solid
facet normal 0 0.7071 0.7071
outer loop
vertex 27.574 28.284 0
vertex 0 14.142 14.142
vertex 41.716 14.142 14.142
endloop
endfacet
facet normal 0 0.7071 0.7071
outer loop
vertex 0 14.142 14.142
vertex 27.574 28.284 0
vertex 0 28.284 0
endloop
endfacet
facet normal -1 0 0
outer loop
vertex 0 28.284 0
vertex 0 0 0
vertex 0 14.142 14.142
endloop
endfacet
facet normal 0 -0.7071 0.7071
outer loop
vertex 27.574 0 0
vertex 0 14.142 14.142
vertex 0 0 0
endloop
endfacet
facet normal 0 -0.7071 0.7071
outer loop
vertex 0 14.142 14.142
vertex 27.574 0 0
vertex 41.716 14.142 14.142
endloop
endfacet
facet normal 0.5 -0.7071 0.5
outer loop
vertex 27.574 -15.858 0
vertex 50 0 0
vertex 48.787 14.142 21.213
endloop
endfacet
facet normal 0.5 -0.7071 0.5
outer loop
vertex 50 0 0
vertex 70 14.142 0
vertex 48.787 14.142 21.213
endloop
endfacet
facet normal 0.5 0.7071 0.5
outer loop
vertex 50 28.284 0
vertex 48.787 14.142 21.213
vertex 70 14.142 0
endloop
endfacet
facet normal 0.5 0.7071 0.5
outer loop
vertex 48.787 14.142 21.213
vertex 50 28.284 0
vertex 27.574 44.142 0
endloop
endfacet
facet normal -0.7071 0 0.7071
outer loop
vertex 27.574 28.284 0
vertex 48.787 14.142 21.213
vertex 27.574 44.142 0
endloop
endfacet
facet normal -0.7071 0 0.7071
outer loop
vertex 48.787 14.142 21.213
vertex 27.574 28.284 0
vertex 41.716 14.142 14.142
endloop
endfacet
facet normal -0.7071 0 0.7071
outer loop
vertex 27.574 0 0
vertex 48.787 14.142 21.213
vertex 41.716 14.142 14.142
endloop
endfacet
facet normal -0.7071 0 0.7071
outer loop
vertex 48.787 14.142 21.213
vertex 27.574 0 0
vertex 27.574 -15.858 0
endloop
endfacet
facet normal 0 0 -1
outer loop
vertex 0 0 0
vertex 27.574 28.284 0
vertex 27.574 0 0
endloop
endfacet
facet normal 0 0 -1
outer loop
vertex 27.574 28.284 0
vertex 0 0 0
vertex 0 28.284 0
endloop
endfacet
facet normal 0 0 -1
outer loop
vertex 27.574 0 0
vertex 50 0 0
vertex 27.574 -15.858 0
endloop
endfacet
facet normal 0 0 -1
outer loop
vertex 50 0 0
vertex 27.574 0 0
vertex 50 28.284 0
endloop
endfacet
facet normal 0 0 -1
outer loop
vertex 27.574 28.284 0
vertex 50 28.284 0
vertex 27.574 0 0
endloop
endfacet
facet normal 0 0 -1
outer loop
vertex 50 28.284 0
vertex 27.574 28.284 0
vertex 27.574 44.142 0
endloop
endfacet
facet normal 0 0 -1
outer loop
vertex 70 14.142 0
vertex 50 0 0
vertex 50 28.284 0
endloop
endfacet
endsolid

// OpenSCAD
intersection() {
	union() {
		rotate([-45, 0, 0]) {
			cube([50, 20, 20]);
		}
		translate([70, 20 / sqrt(2),0]) {
			mirror([1, 0, 0]) {
				rotate([90, 45, 0]) {
					rotate([0, 45, 0]) {
						cube([60, 30, 60]);
					}
				}
			}
		}
	}
	//translate([0,20 / sqrt(2), 0]) { //Half arrow.
	translate([0, -50, 0]) { //Whole arrow.
		cube([100, 100, 100]);
	}
}
